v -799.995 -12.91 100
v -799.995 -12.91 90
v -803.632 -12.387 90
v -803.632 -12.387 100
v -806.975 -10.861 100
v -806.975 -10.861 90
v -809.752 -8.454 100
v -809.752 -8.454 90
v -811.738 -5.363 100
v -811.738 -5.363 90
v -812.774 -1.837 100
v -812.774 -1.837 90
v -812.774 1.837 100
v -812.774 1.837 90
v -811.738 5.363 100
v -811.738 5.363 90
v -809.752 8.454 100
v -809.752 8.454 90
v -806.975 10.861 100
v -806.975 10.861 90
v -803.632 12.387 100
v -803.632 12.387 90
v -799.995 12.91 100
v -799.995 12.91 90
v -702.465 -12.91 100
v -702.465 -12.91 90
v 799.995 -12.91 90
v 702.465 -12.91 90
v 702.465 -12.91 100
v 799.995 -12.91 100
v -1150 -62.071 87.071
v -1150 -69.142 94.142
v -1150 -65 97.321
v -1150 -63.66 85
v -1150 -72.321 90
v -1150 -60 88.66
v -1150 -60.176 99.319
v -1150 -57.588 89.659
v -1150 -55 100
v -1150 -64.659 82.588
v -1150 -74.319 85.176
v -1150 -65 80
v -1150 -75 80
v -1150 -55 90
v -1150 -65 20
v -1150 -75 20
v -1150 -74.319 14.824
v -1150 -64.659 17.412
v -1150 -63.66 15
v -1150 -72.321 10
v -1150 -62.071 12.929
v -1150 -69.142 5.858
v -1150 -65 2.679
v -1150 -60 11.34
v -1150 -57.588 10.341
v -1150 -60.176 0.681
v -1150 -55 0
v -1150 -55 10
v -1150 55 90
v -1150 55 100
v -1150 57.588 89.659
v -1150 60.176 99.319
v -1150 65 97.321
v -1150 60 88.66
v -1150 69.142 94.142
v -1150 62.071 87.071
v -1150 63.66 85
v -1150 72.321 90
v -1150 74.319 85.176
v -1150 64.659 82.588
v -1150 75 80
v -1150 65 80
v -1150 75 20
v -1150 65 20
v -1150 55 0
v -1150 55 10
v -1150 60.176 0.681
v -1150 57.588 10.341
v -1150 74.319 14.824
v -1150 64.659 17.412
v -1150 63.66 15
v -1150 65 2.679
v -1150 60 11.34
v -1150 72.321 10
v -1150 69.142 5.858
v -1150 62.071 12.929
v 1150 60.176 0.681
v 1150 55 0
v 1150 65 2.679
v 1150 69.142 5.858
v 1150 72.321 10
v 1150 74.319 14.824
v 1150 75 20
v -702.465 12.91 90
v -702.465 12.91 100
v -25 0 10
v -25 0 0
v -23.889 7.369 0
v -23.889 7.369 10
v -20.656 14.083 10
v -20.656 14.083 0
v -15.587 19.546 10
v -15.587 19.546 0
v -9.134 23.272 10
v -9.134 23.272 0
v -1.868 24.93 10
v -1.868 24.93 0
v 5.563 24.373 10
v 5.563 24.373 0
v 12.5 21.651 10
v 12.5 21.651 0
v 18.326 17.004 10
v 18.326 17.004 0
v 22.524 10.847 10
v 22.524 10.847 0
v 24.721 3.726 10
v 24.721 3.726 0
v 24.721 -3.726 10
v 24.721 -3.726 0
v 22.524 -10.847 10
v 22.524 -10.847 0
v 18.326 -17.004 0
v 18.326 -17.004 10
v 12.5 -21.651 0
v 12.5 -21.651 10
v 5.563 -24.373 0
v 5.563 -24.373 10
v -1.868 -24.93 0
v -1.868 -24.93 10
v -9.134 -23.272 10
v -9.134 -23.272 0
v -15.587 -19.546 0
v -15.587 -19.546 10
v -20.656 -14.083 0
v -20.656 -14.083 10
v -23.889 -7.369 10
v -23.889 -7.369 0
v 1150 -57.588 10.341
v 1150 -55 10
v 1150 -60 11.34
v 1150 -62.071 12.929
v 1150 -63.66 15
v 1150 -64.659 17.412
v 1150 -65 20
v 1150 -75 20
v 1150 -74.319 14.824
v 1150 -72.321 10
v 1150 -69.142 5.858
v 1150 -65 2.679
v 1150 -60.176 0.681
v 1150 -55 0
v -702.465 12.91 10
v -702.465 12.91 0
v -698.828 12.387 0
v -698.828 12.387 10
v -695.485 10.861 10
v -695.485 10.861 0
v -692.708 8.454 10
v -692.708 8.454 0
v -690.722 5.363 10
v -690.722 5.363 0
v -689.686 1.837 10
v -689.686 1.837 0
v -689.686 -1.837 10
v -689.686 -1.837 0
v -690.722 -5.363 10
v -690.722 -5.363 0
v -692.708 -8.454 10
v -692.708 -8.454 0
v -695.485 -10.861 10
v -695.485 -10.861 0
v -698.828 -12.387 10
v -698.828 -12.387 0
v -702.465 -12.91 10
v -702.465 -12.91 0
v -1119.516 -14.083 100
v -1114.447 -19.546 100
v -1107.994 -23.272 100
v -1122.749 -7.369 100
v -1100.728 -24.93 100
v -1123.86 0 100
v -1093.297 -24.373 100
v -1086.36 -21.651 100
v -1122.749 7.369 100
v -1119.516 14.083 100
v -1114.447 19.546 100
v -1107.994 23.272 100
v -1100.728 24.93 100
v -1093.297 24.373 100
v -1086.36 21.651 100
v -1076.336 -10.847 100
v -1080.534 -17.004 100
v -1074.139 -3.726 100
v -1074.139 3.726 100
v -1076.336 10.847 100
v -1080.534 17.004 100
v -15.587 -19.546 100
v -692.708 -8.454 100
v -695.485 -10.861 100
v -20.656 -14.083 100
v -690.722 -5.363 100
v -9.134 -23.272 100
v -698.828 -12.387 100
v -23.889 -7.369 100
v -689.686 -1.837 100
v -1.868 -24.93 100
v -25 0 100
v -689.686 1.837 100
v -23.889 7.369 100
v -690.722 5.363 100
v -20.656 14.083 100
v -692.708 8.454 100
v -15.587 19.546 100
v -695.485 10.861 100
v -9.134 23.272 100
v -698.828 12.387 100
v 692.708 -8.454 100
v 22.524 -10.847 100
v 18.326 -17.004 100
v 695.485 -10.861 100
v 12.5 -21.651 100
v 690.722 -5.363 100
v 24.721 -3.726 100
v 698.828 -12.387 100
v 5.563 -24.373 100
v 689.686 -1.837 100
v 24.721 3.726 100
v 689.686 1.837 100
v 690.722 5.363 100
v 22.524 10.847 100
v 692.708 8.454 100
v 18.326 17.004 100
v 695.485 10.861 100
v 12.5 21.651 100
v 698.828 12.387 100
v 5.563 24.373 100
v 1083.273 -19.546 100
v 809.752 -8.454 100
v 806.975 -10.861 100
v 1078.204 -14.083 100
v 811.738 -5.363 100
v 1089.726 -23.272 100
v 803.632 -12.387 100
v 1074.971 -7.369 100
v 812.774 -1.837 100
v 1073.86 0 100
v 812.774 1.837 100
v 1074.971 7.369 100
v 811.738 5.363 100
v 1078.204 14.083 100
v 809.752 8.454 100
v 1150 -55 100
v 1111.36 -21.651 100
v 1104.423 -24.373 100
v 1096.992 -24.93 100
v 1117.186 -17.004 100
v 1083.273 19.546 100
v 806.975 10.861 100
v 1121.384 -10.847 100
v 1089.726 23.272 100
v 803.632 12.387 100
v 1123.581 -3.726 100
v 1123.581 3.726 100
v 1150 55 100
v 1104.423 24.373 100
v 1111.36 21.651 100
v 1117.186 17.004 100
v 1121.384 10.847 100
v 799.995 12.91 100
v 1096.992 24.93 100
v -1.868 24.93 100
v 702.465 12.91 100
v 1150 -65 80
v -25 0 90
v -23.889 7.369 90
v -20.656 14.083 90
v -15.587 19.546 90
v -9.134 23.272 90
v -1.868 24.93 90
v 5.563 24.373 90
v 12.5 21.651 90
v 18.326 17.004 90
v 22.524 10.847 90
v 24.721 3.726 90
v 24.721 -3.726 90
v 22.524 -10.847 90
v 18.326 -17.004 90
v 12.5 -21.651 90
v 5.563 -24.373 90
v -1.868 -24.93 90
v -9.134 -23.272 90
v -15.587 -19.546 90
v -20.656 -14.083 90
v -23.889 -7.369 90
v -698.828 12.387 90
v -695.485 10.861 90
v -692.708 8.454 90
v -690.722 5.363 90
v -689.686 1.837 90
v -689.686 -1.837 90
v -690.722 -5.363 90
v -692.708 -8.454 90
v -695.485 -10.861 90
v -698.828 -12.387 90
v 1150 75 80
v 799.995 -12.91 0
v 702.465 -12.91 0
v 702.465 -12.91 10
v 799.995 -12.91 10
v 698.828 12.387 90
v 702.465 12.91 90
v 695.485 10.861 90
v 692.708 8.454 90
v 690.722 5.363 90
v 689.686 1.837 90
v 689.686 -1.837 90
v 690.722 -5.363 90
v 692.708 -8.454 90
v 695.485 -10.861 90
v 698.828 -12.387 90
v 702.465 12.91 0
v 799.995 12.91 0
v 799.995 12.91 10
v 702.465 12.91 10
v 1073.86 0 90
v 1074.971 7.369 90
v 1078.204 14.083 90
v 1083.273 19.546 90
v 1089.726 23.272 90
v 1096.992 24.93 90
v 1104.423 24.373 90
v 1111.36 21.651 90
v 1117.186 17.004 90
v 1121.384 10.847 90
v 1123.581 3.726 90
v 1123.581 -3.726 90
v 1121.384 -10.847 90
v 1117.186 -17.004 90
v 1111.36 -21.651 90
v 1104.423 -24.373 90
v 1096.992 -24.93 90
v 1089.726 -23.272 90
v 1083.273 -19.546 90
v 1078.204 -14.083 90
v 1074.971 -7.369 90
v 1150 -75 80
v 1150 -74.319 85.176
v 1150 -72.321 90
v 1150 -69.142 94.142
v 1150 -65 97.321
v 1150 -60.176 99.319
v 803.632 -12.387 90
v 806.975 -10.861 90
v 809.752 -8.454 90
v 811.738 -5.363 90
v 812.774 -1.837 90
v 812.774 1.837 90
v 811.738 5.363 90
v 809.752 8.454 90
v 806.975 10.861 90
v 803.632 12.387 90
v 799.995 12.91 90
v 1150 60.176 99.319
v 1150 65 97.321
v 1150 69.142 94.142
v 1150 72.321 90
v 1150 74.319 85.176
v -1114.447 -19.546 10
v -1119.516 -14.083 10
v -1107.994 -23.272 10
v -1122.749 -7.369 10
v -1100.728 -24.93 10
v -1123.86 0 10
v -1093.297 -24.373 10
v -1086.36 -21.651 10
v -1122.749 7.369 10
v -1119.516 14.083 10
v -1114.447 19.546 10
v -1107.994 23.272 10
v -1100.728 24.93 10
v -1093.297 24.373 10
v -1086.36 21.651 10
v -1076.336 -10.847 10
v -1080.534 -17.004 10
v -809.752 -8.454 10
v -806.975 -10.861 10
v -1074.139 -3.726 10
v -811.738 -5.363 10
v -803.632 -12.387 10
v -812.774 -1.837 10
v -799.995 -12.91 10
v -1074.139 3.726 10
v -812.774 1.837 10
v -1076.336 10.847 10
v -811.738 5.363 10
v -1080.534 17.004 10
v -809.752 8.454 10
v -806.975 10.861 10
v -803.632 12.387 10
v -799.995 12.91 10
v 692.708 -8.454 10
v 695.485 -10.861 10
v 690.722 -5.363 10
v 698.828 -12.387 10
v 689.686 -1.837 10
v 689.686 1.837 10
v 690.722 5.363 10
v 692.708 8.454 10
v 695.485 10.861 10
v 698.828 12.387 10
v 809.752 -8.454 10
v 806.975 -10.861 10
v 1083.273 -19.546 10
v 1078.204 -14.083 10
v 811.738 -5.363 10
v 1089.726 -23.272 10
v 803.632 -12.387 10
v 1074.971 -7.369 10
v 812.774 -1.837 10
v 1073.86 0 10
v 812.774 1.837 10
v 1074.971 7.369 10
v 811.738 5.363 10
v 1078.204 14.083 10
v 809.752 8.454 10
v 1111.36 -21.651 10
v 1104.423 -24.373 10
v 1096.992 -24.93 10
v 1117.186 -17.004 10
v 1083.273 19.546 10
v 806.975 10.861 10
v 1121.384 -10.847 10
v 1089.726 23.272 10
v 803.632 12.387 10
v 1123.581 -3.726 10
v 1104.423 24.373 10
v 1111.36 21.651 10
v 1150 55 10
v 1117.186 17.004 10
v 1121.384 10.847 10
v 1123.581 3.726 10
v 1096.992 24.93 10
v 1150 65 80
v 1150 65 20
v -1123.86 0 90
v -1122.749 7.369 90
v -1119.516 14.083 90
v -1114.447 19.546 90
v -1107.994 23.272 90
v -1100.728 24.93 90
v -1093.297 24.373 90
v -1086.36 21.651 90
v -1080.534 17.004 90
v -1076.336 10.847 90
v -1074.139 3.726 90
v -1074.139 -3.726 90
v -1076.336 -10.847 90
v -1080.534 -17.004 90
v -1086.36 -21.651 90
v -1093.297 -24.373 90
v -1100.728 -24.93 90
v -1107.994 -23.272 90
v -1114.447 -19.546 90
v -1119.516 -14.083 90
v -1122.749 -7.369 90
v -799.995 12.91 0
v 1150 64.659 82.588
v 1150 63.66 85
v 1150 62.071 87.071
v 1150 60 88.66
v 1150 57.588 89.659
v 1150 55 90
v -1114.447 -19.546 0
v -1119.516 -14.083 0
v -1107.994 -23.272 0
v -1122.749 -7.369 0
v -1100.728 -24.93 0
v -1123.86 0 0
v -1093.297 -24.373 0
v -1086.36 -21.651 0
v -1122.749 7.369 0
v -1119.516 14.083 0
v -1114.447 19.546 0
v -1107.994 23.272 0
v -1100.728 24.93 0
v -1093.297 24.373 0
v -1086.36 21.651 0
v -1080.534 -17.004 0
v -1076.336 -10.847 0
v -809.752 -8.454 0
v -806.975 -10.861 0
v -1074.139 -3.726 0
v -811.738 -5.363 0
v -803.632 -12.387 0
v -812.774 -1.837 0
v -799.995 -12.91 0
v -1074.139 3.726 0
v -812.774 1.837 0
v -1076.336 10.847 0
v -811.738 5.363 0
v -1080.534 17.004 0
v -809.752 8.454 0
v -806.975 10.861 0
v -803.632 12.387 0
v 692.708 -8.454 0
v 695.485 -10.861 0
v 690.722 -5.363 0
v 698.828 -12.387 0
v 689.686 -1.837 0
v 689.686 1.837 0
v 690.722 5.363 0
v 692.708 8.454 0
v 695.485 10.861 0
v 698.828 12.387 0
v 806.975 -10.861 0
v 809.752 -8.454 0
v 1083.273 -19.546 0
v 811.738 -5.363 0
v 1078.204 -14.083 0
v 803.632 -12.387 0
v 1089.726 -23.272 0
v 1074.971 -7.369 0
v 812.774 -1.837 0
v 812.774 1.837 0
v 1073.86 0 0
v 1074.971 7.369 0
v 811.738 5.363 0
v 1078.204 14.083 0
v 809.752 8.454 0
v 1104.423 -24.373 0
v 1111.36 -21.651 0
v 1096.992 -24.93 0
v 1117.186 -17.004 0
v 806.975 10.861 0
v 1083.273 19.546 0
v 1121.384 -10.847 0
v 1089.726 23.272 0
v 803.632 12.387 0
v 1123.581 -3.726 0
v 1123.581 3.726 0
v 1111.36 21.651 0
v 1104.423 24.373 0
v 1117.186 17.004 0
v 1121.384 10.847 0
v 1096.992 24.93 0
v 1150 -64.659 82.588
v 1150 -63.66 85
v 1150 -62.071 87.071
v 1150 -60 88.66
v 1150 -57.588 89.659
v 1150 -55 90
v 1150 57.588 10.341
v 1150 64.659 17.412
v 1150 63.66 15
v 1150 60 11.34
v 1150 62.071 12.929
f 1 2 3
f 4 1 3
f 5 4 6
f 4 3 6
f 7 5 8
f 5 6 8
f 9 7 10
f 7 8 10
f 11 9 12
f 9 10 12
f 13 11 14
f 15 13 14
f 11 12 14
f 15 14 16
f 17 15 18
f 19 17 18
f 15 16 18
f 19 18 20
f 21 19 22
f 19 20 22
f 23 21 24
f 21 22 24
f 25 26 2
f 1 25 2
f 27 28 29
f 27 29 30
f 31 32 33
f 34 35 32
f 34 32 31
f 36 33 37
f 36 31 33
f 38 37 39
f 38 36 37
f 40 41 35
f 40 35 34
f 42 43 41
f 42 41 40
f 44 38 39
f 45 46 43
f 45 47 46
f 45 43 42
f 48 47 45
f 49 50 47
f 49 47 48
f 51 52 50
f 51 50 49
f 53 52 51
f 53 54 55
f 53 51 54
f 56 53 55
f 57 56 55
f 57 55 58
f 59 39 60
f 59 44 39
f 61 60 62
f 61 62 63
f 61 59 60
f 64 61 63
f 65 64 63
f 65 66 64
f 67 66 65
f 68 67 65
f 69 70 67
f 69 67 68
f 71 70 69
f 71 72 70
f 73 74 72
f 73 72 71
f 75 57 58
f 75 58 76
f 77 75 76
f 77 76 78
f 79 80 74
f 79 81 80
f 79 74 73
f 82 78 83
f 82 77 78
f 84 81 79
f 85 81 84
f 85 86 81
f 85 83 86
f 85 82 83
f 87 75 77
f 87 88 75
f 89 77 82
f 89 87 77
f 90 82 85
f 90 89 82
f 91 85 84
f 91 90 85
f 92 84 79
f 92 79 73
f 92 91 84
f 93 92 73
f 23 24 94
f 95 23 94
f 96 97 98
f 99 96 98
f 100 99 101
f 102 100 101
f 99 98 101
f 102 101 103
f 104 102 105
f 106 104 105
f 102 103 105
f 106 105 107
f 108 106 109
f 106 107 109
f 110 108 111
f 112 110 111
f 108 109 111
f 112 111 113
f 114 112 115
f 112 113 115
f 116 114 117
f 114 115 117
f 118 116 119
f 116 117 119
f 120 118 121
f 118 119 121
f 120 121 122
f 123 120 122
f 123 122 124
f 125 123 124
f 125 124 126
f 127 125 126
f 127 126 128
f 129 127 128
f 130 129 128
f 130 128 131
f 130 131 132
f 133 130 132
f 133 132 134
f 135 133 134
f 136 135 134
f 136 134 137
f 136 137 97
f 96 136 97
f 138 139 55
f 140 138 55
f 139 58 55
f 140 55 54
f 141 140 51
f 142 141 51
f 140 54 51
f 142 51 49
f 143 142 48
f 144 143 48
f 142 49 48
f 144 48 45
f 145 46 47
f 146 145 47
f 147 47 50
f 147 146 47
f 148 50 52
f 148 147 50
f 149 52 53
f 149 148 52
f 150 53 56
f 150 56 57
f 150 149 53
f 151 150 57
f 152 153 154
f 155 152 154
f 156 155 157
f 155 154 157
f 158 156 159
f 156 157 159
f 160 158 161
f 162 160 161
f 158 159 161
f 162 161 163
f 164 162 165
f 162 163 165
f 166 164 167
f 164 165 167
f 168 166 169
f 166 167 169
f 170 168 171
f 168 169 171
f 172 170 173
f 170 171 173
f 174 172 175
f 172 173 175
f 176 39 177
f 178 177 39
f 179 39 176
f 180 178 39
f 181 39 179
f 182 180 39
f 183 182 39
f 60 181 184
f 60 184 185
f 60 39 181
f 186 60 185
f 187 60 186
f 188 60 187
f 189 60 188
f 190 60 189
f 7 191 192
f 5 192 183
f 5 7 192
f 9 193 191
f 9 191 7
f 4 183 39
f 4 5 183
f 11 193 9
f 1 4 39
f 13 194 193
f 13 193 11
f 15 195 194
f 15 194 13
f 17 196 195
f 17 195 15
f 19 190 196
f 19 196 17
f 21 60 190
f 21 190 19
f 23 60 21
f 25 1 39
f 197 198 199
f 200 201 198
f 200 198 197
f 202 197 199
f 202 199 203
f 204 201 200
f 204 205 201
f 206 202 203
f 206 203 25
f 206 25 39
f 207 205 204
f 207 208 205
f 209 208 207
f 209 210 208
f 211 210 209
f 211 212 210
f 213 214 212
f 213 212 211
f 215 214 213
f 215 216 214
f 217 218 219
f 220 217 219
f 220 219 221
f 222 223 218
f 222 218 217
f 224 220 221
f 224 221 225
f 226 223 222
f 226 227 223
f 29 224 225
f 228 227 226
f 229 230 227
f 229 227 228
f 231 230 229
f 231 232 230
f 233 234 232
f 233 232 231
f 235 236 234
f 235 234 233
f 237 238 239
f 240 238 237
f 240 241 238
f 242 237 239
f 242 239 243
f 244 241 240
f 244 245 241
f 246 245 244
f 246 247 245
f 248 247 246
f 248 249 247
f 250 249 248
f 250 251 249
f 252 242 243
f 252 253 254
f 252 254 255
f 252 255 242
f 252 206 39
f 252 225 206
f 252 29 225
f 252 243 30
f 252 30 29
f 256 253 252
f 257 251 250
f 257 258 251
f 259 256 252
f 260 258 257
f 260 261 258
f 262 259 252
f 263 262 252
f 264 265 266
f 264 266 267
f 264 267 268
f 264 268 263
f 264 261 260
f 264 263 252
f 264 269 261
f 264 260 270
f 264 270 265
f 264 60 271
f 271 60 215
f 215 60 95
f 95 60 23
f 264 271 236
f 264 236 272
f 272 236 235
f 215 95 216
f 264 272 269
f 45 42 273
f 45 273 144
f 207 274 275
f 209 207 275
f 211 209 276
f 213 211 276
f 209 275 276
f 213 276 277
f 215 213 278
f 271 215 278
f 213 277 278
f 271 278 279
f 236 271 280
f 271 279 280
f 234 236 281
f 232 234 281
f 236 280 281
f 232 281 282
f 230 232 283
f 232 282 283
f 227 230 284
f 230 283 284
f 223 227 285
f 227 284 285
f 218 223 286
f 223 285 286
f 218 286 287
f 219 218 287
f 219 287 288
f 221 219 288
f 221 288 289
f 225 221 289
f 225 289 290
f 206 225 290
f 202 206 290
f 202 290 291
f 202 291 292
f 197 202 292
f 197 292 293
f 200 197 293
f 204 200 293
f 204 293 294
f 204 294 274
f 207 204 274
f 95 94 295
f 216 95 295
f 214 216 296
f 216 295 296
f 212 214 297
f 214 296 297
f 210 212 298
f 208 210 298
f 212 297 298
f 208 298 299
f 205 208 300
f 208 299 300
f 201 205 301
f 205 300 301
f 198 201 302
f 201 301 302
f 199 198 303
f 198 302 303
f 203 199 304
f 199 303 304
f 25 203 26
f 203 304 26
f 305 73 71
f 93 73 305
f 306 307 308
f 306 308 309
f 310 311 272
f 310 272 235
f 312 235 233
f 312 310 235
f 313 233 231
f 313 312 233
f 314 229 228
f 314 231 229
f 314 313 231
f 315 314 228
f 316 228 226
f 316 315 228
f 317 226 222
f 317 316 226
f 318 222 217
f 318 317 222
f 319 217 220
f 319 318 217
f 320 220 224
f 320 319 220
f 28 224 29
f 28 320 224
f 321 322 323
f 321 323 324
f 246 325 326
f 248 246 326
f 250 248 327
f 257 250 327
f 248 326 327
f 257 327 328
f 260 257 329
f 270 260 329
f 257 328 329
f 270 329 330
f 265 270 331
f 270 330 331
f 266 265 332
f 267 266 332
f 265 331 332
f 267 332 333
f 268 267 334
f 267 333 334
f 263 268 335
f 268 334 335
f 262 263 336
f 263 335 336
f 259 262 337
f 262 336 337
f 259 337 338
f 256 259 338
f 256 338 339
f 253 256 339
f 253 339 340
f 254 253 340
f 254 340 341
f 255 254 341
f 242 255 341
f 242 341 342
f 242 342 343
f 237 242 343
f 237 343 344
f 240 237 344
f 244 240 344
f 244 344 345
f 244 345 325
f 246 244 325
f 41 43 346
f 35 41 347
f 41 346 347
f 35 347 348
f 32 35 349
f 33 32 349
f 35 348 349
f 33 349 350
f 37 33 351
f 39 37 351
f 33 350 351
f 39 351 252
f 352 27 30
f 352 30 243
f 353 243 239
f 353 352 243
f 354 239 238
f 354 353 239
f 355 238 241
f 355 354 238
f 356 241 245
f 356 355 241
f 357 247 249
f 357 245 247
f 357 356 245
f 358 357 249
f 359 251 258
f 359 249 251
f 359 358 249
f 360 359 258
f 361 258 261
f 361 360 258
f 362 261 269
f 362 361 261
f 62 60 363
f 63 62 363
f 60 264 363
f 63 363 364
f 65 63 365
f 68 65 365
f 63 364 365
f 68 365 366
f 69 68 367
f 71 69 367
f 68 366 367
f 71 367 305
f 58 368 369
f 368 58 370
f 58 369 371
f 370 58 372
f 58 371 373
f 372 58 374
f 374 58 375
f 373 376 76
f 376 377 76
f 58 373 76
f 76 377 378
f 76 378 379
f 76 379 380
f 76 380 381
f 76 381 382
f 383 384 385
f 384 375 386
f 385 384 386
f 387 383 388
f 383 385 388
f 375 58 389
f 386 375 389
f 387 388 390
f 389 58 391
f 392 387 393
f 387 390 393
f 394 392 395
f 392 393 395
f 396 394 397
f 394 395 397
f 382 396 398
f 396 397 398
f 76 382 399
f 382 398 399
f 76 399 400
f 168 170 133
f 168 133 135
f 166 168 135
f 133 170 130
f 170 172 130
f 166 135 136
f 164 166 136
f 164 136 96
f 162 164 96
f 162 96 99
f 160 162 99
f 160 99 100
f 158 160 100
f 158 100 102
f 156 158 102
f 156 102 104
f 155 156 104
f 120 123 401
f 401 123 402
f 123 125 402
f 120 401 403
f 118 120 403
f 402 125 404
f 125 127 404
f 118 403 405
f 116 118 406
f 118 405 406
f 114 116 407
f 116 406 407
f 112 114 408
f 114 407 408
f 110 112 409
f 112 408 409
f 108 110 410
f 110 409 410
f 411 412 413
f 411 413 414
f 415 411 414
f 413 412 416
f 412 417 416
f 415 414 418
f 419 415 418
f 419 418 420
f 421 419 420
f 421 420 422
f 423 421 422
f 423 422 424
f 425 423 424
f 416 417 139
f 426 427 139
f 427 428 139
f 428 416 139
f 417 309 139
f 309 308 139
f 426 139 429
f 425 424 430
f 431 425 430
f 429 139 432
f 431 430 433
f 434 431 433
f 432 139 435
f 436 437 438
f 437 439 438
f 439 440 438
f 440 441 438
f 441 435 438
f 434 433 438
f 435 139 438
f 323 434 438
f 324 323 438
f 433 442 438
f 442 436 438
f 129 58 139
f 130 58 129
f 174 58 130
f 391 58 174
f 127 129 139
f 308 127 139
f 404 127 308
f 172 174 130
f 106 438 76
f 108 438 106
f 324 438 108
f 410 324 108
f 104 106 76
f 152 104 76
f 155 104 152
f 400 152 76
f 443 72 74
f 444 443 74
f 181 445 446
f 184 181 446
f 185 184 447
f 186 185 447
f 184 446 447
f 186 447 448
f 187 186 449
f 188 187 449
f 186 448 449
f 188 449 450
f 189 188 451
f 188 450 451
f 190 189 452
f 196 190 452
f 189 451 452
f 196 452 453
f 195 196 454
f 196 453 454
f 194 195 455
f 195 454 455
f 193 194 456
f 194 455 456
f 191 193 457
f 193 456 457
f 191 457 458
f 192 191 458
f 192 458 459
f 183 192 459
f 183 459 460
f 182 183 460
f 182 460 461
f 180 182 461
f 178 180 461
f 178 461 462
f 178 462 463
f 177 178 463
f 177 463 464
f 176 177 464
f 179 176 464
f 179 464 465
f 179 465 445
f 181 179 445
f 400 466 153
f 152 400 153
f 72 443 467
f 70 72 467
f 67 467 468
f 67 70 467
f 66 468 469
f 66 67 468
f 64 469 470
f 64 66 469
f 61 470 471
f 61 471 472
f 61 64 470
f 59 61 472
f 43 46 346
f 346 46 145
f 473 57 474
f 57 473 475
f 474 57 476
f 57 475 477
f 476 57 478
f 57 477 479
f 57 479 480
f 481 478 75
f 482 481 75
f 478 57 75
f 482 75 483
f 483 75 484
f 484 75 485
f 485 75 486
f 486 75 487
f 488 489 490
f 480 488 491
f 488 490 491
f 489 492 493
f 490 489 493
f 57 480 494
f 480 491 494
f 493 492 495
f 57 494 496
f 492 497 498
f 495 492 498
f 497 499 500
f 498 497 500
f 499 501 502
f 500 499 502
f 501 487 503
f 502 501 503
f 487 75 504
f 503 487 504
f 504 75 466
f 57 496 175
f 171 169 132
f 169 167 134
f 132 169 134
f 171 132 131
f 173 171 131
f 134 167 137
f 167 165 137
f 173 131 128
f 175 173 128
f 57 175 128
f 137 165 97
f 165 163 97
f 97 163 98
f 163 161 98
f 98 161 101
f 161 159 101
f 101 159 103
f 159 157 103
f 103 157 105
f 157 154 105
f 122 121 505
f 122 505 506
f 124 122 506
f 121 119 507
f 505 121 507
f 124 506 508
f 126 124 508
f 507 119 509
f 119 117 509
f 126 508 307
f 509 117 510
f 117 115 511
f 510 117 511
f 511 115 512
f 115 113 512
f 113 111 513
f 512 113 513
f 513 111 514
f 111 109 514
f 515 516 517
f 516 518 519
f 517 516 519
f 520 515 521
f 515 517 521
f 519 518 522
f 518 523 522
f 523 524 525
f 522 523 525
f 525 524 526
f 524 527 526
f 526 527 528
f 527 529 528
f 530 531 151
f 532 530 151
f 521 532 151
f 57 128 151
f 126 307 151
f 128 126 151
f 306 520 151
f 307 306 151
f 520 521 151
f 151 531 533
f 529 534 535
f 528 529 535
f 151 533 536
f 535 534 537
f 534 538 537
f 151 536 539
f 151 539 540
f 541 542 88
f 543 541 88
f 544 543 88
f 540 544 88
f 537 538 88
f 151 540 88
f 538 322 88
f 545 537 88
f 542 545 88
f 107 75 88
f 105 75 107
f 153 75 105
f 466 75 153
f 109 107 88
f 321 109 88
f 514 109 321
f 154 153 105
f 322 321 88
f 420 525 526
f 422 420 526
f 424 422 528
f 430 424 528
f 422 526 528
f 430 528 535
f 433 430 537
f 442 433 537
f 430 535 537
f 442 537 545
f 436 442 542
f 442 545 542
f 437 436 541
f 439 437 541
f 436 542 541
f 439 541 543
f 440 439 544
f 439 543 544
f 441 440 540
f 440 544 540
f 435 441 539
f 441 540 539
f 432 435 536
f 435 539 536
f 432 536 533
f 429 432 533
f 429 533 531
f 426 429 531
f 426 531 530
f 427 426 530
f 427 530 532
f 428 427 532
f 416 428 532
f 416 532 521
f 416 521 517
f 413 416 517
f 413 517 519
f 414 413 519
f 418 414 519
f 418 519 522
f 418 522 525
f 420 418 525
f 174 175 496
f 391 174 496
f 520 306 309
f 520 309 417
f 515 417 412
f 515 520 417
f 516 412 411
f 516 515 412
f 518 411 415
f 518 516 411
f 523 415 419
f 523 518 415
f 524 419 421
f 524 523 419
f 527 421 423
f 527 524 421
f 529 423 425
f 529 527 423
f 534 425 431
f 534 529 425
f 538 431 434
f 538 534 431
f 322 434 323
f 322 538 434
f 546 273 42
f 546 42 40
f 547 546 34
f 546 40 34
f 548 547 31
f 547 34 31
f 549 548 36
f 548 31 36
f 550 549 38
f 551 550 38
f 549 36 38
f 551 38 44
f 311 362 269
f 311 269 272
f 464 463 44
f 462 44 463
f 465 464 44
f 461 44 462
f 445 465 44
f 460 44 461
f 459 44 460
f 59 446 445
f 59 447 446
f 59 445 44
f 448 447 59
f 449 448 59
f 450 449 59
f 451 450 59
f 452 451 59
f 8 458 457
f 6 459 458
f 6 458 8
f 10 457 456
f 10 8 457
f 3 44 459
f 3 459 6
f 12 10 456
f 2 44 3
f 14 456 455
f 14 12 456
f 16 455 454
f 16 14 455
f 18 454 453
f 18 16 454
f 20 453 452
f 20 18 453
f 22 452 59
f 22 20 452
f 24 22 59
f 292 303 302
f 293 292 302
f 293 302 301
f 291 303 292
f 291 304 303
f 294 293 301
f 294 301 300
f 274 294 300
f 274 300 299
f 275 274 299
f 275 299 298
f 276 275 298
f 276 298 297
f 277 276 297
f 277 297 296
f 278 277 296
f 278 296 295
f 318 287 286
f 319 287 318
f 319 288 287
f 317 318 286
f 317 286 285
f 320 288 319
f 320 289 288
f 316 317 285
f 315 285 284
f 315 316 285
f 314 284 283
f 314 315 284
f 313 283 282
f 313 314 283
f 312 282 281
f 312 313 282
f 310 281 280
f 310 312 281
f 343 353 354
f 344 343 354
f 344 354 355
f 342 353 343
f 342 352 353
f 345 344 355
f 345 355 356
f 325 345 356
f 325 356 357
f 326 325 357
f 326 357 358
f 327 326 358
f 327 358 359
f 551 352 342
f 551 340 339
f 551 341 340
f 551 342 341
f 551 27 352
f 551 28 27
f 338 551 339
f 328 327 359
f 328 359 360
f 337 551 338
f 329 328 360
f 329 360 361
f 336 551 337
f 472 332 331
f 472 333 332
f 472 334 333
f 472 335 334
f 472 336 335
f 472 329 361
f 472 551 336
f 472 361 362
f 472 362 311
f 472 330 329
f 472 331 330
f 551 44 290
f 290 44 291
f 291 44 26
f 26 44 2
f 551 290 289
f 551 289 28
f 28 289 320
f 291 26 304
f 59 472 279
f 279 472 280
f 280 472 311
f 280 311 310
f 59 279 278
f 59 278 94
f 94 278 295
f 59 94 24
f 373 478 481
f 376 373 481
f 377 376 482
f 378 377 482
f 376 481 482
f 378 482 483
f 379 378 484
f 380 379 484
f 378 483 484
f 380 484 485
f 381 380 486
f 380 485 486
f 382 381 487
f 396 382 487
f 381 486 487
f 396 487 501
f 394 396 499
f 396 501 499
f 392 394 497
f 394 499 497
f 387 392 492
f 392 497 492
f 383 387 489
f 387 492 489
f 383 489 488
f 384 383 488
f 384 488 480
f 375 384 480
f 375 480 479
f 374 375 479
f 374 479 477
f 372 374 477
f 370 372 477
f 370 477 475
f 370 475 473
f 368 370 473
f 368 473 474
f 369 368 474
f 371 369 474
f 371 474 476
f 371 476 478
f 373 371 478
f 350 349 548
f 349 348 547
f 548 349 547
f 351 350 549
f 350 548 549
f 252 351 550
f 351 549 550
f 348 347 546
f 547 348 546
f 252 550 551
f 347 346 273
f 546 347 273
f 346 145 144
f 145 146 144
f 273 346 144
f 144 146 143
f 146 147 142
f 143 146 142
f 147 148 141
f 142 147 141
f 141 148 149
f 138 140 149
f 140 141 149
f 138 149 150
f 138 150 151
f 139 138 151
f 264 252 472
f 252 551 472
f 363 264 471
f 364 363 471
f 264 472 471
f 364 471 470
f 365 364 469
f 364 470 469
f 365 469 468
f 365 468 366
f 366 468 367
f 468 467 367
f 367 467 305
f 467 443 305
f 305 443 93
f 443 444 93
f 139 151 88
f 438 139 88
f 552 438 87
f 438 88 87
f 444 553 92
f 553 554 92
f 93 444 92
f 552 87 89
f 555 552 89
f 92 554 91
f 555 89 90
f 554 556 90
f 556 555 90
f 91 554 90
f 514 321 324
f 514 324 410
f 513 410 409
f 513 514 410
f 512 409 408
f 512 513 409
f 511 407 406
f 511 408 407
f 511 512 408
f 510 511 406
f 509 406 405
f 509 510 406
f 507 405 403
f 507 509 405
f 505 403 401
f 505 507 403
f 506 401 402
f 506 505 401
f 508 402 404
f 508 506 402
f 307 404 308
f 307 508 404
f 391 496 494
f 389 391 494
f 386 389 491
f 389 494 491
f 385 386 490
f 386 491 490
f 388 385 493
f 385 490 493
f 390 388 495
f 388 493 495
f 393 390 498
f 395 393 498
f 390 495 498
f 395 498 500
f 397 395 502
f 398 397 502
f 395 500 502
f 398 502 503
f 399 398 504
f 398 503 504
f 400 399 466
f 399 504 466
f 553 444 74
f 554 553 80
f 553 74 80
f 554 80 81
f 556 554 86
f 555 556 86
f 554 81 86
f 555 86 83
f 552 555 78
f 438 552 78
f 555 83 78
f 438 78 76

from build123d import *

# Parameters (mm, degrees)
SKETCH1_W           = 2300
SKETCH1_H           = 150
BOSS_EXTRUDE1_DEPTH = 100
SKETCH2_W           = 80
SKETCH2_H           = 130
CUT_EXTRUDE1_DEPTH  = 2304.394234602
FILLET1_R           = 10
FILLET2_R           = 20
SKETCH3_R           = 25
CUT_EXTRUDE2_DEPTH  = 1157.773530126
CUT_EXTRUDE3_DEPTH  = 1157.773530126


with BuildPart() as part:
    # Sketch1 → Boss-Extrude1 (new body)
    with BuildSketch(Plane.XY):
        Rectangle(SKETCH1_W, SKETCH1_H)
    extrude(amount=BOSS_EXTRUDE1_DEPTH)

    # Sketch2 → Cut-Extrude1 (cut, through all)
    with BuildSketch(Plane(origin=(1150, 0, 0), x_dir=(0, 0, -1), z_dir=(1, 0, 0))):
        with Locations((-50, 0)):
            Rectangle(SKETCH2_W, SKETCH2_H)
    extrude(amount=-CUT_EXTRUDE1_DEPTH, mode=Mode.SUBTRACT)

    # Fillet1
    fillet1_edges = [part.edges().sort_by_distance(p)[0] for p in [
        (0, 65, 90),
        (0, 65, 10),
        (0, -65, 10),
        (0, -65, 90),
    ]]
    fillet(fillet1_edges, radius=FILLET1_R)

    # Fillet2
    fillet2_edges = [part.edges().sort_by_distance(p)[0] for p in [
        (0, -75, 100),
        (0, -75, 0),
        (0, 75, 0),
        (0, 75, 100),
    ]]
    fillet(fillet2_edges, radius=FILLET2_R)

    # Sketch3 → Cut-Extrude2 (cut, through all)
    with BuildSketch(Plane(origin=(0, 0, 0), x_dir=(-1, 0, 0), z_dir=(0, 0, -1))):
        Circle(SKETCH3_R)
        with Locations((-1098.86, 0)):
            Circle(SKETCH3_R)
        with Locations((1098.86, 0)):
            Circle(SKETCH3_R)
    extrude(amount=-CUT_EXTRUDE2_DEPTH, mode=Mode.SUBTRACT)

    # Sketch4 → Cut-Extrude3 (cut, through all)
    with BuildSketch(Plane(origin=(0, 0, 0), x_dir=(-1, 0, 0), z_dir=(0, 0, -1))):
        with BuildLine():
            Line((-799.995, 12.91), (-702.465, 12.91))
            ThreePointArc((-702.465, 12.91), (-689.555, 0), (-702.465, -12.91))
            Line((-702.465, -12.91), (-799.995, -12.91))
            ThreePointArc((-799.995, -12.91), (-812.905, 0), (-799.995, 12.91))
        make_face()
        with BuildLine():
            Line((799.995, 12.91), (702.465, 12.91))
            ThreePointArc((702.465, 12.91), (689.555, 0), (702.465, -12.91))
            Line((702.465, -12.91), (799.995, -12.91))
            ThreePointArc((799.995, -12.91), (812.905, 0), (799.995, 12.91))
        make_face()
    extrude(amount=-CUT_EXTRUDE3_DEPTH, mode=Mode.SUBTRACT)


solid = part.part
